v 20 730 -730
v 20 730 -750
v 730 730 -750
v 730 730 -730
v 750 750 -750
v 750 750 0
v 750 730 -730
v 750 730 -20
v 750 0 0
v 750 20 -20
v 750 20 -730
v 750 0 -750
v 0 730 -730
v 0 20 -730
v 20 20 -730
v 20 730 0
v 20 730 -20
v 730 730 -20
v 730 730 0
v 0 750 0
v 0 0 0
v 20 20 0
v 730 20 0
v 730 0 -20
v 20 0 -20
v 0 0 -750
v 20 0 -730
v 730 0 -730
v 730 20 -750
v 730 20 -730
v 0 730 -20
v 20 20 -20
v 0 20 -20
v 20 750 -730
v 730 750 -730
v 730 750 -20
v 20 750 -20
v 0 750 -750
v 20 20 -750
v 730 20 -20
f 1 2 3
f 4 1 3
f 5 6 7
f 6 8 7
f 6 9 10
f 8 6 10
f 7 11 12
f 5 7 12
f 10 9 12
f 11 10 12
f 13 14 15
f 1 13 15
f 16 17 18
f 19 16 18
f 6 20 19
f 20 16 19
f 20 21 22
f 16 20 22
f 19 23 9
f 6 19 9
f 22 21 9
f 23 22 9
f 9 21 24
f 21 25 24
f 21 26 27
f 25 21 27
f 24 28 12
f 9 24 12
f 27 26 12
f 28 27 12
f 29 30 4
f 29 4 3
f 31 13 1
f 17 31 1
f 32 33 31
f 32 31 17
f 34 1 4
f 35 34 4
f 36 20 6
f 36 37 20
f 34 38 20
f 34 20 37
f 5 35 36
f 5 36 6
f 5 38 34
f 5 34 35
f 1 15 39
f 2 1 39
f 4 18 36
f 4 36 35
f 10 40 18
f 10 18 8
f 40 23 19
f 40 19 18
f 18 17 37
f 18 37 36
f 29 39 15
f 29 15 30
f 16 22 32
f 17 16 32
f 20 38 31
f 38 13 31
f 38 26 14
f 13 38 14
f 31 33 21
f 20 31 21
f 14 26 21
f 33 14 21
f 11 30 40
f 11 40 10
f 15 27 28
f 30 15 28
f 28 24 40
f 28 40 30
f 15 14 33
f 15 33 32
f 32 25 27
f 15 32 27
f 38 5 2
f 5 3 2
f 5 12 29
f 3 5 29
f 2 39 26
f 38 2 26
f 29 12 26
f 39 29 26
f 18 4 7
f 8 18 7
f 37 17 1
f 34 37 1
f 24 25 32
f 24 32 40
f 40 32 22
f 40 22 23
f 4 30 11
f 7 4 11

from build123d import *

# Parameters (mm, degrees)
SKETCH1_W           = 750
SKETCH1_H           = 750
SKETCH1_W_2         = 710
SKETCH1_H_2         = 710
BOSS_EXTRUDE1_DEPTH = 20
SKETCH2_W           = 20
SKETCH2_H           = 20
BOSS_EXTRUDE2_DEPTH = 710
SKETCH3_W           = 710
SKETCH3_H           = 710
BOSS_EXTRUDE3_DEPTH = 20


with BuildPart() as part:
    # Sketch1 → Boss-Extrude1 (new body)
    with BuildSketch(Plane(origin=(0, 0, 0), x_dir=(1, 0, 0), z_dir=(0, 1, 0))):
        with Locations((375, 375)):
            Rectangle(SKETCH1_W, SKETCH1_H)
        with Locations((375, 375)):
            Rectangle(SKETCH1_W_2, SKETCH1_H_2, mode=Mode.SUBTRACT)
    extrude(amount=BOSS_EXTRUDE1_DEPTH)

    # Sketch2 → Boss-Extrude2 (add)
    with BuildSketch(Plane(origin=(0, 20, 0), x_dir=(1, 0, 0), z_dir=(0, 1, 0))):
        with Locations((10, 740)):
            Rectangle(SKETCH2_W, SKETCH2_H)
        with Locations((740, 740)):
            Rectangle(SKETCH2_W, SKETCH2_H)
        with Locations((10, 10)):
            Rectangle(SKETCH2_W, SKETCH2_H)
        with Locations((740, 10)):
            Rectangle(SKETCH2_W, SKETCH2_H)
    extrude(amount=BOSS_EXTRUDE2_DEPTH)

    # Sketch3 → Boss-Extrude3 (add)
    with BuildSketch(Plane(origin=(0, 730, 0), x_dir=(1, 0, 0), z_dir=(0, 1, 0))):
        Polygon((730, 750), (20, 750), (0, 750), (0, 730), (0, 20), (0, 0), (20, 0), (730, 0), (750, 0), (750, 20), (750, 730), (750, 750), align=None)
        with Locations((375, 375)):
            Rectangle(SKETCH3_W, SKETCH3_H, mode=Mode.SUBTRACT)
    extrude(amount=BOSS_EXTRUDE3_DEPTH)


solid = part.part
